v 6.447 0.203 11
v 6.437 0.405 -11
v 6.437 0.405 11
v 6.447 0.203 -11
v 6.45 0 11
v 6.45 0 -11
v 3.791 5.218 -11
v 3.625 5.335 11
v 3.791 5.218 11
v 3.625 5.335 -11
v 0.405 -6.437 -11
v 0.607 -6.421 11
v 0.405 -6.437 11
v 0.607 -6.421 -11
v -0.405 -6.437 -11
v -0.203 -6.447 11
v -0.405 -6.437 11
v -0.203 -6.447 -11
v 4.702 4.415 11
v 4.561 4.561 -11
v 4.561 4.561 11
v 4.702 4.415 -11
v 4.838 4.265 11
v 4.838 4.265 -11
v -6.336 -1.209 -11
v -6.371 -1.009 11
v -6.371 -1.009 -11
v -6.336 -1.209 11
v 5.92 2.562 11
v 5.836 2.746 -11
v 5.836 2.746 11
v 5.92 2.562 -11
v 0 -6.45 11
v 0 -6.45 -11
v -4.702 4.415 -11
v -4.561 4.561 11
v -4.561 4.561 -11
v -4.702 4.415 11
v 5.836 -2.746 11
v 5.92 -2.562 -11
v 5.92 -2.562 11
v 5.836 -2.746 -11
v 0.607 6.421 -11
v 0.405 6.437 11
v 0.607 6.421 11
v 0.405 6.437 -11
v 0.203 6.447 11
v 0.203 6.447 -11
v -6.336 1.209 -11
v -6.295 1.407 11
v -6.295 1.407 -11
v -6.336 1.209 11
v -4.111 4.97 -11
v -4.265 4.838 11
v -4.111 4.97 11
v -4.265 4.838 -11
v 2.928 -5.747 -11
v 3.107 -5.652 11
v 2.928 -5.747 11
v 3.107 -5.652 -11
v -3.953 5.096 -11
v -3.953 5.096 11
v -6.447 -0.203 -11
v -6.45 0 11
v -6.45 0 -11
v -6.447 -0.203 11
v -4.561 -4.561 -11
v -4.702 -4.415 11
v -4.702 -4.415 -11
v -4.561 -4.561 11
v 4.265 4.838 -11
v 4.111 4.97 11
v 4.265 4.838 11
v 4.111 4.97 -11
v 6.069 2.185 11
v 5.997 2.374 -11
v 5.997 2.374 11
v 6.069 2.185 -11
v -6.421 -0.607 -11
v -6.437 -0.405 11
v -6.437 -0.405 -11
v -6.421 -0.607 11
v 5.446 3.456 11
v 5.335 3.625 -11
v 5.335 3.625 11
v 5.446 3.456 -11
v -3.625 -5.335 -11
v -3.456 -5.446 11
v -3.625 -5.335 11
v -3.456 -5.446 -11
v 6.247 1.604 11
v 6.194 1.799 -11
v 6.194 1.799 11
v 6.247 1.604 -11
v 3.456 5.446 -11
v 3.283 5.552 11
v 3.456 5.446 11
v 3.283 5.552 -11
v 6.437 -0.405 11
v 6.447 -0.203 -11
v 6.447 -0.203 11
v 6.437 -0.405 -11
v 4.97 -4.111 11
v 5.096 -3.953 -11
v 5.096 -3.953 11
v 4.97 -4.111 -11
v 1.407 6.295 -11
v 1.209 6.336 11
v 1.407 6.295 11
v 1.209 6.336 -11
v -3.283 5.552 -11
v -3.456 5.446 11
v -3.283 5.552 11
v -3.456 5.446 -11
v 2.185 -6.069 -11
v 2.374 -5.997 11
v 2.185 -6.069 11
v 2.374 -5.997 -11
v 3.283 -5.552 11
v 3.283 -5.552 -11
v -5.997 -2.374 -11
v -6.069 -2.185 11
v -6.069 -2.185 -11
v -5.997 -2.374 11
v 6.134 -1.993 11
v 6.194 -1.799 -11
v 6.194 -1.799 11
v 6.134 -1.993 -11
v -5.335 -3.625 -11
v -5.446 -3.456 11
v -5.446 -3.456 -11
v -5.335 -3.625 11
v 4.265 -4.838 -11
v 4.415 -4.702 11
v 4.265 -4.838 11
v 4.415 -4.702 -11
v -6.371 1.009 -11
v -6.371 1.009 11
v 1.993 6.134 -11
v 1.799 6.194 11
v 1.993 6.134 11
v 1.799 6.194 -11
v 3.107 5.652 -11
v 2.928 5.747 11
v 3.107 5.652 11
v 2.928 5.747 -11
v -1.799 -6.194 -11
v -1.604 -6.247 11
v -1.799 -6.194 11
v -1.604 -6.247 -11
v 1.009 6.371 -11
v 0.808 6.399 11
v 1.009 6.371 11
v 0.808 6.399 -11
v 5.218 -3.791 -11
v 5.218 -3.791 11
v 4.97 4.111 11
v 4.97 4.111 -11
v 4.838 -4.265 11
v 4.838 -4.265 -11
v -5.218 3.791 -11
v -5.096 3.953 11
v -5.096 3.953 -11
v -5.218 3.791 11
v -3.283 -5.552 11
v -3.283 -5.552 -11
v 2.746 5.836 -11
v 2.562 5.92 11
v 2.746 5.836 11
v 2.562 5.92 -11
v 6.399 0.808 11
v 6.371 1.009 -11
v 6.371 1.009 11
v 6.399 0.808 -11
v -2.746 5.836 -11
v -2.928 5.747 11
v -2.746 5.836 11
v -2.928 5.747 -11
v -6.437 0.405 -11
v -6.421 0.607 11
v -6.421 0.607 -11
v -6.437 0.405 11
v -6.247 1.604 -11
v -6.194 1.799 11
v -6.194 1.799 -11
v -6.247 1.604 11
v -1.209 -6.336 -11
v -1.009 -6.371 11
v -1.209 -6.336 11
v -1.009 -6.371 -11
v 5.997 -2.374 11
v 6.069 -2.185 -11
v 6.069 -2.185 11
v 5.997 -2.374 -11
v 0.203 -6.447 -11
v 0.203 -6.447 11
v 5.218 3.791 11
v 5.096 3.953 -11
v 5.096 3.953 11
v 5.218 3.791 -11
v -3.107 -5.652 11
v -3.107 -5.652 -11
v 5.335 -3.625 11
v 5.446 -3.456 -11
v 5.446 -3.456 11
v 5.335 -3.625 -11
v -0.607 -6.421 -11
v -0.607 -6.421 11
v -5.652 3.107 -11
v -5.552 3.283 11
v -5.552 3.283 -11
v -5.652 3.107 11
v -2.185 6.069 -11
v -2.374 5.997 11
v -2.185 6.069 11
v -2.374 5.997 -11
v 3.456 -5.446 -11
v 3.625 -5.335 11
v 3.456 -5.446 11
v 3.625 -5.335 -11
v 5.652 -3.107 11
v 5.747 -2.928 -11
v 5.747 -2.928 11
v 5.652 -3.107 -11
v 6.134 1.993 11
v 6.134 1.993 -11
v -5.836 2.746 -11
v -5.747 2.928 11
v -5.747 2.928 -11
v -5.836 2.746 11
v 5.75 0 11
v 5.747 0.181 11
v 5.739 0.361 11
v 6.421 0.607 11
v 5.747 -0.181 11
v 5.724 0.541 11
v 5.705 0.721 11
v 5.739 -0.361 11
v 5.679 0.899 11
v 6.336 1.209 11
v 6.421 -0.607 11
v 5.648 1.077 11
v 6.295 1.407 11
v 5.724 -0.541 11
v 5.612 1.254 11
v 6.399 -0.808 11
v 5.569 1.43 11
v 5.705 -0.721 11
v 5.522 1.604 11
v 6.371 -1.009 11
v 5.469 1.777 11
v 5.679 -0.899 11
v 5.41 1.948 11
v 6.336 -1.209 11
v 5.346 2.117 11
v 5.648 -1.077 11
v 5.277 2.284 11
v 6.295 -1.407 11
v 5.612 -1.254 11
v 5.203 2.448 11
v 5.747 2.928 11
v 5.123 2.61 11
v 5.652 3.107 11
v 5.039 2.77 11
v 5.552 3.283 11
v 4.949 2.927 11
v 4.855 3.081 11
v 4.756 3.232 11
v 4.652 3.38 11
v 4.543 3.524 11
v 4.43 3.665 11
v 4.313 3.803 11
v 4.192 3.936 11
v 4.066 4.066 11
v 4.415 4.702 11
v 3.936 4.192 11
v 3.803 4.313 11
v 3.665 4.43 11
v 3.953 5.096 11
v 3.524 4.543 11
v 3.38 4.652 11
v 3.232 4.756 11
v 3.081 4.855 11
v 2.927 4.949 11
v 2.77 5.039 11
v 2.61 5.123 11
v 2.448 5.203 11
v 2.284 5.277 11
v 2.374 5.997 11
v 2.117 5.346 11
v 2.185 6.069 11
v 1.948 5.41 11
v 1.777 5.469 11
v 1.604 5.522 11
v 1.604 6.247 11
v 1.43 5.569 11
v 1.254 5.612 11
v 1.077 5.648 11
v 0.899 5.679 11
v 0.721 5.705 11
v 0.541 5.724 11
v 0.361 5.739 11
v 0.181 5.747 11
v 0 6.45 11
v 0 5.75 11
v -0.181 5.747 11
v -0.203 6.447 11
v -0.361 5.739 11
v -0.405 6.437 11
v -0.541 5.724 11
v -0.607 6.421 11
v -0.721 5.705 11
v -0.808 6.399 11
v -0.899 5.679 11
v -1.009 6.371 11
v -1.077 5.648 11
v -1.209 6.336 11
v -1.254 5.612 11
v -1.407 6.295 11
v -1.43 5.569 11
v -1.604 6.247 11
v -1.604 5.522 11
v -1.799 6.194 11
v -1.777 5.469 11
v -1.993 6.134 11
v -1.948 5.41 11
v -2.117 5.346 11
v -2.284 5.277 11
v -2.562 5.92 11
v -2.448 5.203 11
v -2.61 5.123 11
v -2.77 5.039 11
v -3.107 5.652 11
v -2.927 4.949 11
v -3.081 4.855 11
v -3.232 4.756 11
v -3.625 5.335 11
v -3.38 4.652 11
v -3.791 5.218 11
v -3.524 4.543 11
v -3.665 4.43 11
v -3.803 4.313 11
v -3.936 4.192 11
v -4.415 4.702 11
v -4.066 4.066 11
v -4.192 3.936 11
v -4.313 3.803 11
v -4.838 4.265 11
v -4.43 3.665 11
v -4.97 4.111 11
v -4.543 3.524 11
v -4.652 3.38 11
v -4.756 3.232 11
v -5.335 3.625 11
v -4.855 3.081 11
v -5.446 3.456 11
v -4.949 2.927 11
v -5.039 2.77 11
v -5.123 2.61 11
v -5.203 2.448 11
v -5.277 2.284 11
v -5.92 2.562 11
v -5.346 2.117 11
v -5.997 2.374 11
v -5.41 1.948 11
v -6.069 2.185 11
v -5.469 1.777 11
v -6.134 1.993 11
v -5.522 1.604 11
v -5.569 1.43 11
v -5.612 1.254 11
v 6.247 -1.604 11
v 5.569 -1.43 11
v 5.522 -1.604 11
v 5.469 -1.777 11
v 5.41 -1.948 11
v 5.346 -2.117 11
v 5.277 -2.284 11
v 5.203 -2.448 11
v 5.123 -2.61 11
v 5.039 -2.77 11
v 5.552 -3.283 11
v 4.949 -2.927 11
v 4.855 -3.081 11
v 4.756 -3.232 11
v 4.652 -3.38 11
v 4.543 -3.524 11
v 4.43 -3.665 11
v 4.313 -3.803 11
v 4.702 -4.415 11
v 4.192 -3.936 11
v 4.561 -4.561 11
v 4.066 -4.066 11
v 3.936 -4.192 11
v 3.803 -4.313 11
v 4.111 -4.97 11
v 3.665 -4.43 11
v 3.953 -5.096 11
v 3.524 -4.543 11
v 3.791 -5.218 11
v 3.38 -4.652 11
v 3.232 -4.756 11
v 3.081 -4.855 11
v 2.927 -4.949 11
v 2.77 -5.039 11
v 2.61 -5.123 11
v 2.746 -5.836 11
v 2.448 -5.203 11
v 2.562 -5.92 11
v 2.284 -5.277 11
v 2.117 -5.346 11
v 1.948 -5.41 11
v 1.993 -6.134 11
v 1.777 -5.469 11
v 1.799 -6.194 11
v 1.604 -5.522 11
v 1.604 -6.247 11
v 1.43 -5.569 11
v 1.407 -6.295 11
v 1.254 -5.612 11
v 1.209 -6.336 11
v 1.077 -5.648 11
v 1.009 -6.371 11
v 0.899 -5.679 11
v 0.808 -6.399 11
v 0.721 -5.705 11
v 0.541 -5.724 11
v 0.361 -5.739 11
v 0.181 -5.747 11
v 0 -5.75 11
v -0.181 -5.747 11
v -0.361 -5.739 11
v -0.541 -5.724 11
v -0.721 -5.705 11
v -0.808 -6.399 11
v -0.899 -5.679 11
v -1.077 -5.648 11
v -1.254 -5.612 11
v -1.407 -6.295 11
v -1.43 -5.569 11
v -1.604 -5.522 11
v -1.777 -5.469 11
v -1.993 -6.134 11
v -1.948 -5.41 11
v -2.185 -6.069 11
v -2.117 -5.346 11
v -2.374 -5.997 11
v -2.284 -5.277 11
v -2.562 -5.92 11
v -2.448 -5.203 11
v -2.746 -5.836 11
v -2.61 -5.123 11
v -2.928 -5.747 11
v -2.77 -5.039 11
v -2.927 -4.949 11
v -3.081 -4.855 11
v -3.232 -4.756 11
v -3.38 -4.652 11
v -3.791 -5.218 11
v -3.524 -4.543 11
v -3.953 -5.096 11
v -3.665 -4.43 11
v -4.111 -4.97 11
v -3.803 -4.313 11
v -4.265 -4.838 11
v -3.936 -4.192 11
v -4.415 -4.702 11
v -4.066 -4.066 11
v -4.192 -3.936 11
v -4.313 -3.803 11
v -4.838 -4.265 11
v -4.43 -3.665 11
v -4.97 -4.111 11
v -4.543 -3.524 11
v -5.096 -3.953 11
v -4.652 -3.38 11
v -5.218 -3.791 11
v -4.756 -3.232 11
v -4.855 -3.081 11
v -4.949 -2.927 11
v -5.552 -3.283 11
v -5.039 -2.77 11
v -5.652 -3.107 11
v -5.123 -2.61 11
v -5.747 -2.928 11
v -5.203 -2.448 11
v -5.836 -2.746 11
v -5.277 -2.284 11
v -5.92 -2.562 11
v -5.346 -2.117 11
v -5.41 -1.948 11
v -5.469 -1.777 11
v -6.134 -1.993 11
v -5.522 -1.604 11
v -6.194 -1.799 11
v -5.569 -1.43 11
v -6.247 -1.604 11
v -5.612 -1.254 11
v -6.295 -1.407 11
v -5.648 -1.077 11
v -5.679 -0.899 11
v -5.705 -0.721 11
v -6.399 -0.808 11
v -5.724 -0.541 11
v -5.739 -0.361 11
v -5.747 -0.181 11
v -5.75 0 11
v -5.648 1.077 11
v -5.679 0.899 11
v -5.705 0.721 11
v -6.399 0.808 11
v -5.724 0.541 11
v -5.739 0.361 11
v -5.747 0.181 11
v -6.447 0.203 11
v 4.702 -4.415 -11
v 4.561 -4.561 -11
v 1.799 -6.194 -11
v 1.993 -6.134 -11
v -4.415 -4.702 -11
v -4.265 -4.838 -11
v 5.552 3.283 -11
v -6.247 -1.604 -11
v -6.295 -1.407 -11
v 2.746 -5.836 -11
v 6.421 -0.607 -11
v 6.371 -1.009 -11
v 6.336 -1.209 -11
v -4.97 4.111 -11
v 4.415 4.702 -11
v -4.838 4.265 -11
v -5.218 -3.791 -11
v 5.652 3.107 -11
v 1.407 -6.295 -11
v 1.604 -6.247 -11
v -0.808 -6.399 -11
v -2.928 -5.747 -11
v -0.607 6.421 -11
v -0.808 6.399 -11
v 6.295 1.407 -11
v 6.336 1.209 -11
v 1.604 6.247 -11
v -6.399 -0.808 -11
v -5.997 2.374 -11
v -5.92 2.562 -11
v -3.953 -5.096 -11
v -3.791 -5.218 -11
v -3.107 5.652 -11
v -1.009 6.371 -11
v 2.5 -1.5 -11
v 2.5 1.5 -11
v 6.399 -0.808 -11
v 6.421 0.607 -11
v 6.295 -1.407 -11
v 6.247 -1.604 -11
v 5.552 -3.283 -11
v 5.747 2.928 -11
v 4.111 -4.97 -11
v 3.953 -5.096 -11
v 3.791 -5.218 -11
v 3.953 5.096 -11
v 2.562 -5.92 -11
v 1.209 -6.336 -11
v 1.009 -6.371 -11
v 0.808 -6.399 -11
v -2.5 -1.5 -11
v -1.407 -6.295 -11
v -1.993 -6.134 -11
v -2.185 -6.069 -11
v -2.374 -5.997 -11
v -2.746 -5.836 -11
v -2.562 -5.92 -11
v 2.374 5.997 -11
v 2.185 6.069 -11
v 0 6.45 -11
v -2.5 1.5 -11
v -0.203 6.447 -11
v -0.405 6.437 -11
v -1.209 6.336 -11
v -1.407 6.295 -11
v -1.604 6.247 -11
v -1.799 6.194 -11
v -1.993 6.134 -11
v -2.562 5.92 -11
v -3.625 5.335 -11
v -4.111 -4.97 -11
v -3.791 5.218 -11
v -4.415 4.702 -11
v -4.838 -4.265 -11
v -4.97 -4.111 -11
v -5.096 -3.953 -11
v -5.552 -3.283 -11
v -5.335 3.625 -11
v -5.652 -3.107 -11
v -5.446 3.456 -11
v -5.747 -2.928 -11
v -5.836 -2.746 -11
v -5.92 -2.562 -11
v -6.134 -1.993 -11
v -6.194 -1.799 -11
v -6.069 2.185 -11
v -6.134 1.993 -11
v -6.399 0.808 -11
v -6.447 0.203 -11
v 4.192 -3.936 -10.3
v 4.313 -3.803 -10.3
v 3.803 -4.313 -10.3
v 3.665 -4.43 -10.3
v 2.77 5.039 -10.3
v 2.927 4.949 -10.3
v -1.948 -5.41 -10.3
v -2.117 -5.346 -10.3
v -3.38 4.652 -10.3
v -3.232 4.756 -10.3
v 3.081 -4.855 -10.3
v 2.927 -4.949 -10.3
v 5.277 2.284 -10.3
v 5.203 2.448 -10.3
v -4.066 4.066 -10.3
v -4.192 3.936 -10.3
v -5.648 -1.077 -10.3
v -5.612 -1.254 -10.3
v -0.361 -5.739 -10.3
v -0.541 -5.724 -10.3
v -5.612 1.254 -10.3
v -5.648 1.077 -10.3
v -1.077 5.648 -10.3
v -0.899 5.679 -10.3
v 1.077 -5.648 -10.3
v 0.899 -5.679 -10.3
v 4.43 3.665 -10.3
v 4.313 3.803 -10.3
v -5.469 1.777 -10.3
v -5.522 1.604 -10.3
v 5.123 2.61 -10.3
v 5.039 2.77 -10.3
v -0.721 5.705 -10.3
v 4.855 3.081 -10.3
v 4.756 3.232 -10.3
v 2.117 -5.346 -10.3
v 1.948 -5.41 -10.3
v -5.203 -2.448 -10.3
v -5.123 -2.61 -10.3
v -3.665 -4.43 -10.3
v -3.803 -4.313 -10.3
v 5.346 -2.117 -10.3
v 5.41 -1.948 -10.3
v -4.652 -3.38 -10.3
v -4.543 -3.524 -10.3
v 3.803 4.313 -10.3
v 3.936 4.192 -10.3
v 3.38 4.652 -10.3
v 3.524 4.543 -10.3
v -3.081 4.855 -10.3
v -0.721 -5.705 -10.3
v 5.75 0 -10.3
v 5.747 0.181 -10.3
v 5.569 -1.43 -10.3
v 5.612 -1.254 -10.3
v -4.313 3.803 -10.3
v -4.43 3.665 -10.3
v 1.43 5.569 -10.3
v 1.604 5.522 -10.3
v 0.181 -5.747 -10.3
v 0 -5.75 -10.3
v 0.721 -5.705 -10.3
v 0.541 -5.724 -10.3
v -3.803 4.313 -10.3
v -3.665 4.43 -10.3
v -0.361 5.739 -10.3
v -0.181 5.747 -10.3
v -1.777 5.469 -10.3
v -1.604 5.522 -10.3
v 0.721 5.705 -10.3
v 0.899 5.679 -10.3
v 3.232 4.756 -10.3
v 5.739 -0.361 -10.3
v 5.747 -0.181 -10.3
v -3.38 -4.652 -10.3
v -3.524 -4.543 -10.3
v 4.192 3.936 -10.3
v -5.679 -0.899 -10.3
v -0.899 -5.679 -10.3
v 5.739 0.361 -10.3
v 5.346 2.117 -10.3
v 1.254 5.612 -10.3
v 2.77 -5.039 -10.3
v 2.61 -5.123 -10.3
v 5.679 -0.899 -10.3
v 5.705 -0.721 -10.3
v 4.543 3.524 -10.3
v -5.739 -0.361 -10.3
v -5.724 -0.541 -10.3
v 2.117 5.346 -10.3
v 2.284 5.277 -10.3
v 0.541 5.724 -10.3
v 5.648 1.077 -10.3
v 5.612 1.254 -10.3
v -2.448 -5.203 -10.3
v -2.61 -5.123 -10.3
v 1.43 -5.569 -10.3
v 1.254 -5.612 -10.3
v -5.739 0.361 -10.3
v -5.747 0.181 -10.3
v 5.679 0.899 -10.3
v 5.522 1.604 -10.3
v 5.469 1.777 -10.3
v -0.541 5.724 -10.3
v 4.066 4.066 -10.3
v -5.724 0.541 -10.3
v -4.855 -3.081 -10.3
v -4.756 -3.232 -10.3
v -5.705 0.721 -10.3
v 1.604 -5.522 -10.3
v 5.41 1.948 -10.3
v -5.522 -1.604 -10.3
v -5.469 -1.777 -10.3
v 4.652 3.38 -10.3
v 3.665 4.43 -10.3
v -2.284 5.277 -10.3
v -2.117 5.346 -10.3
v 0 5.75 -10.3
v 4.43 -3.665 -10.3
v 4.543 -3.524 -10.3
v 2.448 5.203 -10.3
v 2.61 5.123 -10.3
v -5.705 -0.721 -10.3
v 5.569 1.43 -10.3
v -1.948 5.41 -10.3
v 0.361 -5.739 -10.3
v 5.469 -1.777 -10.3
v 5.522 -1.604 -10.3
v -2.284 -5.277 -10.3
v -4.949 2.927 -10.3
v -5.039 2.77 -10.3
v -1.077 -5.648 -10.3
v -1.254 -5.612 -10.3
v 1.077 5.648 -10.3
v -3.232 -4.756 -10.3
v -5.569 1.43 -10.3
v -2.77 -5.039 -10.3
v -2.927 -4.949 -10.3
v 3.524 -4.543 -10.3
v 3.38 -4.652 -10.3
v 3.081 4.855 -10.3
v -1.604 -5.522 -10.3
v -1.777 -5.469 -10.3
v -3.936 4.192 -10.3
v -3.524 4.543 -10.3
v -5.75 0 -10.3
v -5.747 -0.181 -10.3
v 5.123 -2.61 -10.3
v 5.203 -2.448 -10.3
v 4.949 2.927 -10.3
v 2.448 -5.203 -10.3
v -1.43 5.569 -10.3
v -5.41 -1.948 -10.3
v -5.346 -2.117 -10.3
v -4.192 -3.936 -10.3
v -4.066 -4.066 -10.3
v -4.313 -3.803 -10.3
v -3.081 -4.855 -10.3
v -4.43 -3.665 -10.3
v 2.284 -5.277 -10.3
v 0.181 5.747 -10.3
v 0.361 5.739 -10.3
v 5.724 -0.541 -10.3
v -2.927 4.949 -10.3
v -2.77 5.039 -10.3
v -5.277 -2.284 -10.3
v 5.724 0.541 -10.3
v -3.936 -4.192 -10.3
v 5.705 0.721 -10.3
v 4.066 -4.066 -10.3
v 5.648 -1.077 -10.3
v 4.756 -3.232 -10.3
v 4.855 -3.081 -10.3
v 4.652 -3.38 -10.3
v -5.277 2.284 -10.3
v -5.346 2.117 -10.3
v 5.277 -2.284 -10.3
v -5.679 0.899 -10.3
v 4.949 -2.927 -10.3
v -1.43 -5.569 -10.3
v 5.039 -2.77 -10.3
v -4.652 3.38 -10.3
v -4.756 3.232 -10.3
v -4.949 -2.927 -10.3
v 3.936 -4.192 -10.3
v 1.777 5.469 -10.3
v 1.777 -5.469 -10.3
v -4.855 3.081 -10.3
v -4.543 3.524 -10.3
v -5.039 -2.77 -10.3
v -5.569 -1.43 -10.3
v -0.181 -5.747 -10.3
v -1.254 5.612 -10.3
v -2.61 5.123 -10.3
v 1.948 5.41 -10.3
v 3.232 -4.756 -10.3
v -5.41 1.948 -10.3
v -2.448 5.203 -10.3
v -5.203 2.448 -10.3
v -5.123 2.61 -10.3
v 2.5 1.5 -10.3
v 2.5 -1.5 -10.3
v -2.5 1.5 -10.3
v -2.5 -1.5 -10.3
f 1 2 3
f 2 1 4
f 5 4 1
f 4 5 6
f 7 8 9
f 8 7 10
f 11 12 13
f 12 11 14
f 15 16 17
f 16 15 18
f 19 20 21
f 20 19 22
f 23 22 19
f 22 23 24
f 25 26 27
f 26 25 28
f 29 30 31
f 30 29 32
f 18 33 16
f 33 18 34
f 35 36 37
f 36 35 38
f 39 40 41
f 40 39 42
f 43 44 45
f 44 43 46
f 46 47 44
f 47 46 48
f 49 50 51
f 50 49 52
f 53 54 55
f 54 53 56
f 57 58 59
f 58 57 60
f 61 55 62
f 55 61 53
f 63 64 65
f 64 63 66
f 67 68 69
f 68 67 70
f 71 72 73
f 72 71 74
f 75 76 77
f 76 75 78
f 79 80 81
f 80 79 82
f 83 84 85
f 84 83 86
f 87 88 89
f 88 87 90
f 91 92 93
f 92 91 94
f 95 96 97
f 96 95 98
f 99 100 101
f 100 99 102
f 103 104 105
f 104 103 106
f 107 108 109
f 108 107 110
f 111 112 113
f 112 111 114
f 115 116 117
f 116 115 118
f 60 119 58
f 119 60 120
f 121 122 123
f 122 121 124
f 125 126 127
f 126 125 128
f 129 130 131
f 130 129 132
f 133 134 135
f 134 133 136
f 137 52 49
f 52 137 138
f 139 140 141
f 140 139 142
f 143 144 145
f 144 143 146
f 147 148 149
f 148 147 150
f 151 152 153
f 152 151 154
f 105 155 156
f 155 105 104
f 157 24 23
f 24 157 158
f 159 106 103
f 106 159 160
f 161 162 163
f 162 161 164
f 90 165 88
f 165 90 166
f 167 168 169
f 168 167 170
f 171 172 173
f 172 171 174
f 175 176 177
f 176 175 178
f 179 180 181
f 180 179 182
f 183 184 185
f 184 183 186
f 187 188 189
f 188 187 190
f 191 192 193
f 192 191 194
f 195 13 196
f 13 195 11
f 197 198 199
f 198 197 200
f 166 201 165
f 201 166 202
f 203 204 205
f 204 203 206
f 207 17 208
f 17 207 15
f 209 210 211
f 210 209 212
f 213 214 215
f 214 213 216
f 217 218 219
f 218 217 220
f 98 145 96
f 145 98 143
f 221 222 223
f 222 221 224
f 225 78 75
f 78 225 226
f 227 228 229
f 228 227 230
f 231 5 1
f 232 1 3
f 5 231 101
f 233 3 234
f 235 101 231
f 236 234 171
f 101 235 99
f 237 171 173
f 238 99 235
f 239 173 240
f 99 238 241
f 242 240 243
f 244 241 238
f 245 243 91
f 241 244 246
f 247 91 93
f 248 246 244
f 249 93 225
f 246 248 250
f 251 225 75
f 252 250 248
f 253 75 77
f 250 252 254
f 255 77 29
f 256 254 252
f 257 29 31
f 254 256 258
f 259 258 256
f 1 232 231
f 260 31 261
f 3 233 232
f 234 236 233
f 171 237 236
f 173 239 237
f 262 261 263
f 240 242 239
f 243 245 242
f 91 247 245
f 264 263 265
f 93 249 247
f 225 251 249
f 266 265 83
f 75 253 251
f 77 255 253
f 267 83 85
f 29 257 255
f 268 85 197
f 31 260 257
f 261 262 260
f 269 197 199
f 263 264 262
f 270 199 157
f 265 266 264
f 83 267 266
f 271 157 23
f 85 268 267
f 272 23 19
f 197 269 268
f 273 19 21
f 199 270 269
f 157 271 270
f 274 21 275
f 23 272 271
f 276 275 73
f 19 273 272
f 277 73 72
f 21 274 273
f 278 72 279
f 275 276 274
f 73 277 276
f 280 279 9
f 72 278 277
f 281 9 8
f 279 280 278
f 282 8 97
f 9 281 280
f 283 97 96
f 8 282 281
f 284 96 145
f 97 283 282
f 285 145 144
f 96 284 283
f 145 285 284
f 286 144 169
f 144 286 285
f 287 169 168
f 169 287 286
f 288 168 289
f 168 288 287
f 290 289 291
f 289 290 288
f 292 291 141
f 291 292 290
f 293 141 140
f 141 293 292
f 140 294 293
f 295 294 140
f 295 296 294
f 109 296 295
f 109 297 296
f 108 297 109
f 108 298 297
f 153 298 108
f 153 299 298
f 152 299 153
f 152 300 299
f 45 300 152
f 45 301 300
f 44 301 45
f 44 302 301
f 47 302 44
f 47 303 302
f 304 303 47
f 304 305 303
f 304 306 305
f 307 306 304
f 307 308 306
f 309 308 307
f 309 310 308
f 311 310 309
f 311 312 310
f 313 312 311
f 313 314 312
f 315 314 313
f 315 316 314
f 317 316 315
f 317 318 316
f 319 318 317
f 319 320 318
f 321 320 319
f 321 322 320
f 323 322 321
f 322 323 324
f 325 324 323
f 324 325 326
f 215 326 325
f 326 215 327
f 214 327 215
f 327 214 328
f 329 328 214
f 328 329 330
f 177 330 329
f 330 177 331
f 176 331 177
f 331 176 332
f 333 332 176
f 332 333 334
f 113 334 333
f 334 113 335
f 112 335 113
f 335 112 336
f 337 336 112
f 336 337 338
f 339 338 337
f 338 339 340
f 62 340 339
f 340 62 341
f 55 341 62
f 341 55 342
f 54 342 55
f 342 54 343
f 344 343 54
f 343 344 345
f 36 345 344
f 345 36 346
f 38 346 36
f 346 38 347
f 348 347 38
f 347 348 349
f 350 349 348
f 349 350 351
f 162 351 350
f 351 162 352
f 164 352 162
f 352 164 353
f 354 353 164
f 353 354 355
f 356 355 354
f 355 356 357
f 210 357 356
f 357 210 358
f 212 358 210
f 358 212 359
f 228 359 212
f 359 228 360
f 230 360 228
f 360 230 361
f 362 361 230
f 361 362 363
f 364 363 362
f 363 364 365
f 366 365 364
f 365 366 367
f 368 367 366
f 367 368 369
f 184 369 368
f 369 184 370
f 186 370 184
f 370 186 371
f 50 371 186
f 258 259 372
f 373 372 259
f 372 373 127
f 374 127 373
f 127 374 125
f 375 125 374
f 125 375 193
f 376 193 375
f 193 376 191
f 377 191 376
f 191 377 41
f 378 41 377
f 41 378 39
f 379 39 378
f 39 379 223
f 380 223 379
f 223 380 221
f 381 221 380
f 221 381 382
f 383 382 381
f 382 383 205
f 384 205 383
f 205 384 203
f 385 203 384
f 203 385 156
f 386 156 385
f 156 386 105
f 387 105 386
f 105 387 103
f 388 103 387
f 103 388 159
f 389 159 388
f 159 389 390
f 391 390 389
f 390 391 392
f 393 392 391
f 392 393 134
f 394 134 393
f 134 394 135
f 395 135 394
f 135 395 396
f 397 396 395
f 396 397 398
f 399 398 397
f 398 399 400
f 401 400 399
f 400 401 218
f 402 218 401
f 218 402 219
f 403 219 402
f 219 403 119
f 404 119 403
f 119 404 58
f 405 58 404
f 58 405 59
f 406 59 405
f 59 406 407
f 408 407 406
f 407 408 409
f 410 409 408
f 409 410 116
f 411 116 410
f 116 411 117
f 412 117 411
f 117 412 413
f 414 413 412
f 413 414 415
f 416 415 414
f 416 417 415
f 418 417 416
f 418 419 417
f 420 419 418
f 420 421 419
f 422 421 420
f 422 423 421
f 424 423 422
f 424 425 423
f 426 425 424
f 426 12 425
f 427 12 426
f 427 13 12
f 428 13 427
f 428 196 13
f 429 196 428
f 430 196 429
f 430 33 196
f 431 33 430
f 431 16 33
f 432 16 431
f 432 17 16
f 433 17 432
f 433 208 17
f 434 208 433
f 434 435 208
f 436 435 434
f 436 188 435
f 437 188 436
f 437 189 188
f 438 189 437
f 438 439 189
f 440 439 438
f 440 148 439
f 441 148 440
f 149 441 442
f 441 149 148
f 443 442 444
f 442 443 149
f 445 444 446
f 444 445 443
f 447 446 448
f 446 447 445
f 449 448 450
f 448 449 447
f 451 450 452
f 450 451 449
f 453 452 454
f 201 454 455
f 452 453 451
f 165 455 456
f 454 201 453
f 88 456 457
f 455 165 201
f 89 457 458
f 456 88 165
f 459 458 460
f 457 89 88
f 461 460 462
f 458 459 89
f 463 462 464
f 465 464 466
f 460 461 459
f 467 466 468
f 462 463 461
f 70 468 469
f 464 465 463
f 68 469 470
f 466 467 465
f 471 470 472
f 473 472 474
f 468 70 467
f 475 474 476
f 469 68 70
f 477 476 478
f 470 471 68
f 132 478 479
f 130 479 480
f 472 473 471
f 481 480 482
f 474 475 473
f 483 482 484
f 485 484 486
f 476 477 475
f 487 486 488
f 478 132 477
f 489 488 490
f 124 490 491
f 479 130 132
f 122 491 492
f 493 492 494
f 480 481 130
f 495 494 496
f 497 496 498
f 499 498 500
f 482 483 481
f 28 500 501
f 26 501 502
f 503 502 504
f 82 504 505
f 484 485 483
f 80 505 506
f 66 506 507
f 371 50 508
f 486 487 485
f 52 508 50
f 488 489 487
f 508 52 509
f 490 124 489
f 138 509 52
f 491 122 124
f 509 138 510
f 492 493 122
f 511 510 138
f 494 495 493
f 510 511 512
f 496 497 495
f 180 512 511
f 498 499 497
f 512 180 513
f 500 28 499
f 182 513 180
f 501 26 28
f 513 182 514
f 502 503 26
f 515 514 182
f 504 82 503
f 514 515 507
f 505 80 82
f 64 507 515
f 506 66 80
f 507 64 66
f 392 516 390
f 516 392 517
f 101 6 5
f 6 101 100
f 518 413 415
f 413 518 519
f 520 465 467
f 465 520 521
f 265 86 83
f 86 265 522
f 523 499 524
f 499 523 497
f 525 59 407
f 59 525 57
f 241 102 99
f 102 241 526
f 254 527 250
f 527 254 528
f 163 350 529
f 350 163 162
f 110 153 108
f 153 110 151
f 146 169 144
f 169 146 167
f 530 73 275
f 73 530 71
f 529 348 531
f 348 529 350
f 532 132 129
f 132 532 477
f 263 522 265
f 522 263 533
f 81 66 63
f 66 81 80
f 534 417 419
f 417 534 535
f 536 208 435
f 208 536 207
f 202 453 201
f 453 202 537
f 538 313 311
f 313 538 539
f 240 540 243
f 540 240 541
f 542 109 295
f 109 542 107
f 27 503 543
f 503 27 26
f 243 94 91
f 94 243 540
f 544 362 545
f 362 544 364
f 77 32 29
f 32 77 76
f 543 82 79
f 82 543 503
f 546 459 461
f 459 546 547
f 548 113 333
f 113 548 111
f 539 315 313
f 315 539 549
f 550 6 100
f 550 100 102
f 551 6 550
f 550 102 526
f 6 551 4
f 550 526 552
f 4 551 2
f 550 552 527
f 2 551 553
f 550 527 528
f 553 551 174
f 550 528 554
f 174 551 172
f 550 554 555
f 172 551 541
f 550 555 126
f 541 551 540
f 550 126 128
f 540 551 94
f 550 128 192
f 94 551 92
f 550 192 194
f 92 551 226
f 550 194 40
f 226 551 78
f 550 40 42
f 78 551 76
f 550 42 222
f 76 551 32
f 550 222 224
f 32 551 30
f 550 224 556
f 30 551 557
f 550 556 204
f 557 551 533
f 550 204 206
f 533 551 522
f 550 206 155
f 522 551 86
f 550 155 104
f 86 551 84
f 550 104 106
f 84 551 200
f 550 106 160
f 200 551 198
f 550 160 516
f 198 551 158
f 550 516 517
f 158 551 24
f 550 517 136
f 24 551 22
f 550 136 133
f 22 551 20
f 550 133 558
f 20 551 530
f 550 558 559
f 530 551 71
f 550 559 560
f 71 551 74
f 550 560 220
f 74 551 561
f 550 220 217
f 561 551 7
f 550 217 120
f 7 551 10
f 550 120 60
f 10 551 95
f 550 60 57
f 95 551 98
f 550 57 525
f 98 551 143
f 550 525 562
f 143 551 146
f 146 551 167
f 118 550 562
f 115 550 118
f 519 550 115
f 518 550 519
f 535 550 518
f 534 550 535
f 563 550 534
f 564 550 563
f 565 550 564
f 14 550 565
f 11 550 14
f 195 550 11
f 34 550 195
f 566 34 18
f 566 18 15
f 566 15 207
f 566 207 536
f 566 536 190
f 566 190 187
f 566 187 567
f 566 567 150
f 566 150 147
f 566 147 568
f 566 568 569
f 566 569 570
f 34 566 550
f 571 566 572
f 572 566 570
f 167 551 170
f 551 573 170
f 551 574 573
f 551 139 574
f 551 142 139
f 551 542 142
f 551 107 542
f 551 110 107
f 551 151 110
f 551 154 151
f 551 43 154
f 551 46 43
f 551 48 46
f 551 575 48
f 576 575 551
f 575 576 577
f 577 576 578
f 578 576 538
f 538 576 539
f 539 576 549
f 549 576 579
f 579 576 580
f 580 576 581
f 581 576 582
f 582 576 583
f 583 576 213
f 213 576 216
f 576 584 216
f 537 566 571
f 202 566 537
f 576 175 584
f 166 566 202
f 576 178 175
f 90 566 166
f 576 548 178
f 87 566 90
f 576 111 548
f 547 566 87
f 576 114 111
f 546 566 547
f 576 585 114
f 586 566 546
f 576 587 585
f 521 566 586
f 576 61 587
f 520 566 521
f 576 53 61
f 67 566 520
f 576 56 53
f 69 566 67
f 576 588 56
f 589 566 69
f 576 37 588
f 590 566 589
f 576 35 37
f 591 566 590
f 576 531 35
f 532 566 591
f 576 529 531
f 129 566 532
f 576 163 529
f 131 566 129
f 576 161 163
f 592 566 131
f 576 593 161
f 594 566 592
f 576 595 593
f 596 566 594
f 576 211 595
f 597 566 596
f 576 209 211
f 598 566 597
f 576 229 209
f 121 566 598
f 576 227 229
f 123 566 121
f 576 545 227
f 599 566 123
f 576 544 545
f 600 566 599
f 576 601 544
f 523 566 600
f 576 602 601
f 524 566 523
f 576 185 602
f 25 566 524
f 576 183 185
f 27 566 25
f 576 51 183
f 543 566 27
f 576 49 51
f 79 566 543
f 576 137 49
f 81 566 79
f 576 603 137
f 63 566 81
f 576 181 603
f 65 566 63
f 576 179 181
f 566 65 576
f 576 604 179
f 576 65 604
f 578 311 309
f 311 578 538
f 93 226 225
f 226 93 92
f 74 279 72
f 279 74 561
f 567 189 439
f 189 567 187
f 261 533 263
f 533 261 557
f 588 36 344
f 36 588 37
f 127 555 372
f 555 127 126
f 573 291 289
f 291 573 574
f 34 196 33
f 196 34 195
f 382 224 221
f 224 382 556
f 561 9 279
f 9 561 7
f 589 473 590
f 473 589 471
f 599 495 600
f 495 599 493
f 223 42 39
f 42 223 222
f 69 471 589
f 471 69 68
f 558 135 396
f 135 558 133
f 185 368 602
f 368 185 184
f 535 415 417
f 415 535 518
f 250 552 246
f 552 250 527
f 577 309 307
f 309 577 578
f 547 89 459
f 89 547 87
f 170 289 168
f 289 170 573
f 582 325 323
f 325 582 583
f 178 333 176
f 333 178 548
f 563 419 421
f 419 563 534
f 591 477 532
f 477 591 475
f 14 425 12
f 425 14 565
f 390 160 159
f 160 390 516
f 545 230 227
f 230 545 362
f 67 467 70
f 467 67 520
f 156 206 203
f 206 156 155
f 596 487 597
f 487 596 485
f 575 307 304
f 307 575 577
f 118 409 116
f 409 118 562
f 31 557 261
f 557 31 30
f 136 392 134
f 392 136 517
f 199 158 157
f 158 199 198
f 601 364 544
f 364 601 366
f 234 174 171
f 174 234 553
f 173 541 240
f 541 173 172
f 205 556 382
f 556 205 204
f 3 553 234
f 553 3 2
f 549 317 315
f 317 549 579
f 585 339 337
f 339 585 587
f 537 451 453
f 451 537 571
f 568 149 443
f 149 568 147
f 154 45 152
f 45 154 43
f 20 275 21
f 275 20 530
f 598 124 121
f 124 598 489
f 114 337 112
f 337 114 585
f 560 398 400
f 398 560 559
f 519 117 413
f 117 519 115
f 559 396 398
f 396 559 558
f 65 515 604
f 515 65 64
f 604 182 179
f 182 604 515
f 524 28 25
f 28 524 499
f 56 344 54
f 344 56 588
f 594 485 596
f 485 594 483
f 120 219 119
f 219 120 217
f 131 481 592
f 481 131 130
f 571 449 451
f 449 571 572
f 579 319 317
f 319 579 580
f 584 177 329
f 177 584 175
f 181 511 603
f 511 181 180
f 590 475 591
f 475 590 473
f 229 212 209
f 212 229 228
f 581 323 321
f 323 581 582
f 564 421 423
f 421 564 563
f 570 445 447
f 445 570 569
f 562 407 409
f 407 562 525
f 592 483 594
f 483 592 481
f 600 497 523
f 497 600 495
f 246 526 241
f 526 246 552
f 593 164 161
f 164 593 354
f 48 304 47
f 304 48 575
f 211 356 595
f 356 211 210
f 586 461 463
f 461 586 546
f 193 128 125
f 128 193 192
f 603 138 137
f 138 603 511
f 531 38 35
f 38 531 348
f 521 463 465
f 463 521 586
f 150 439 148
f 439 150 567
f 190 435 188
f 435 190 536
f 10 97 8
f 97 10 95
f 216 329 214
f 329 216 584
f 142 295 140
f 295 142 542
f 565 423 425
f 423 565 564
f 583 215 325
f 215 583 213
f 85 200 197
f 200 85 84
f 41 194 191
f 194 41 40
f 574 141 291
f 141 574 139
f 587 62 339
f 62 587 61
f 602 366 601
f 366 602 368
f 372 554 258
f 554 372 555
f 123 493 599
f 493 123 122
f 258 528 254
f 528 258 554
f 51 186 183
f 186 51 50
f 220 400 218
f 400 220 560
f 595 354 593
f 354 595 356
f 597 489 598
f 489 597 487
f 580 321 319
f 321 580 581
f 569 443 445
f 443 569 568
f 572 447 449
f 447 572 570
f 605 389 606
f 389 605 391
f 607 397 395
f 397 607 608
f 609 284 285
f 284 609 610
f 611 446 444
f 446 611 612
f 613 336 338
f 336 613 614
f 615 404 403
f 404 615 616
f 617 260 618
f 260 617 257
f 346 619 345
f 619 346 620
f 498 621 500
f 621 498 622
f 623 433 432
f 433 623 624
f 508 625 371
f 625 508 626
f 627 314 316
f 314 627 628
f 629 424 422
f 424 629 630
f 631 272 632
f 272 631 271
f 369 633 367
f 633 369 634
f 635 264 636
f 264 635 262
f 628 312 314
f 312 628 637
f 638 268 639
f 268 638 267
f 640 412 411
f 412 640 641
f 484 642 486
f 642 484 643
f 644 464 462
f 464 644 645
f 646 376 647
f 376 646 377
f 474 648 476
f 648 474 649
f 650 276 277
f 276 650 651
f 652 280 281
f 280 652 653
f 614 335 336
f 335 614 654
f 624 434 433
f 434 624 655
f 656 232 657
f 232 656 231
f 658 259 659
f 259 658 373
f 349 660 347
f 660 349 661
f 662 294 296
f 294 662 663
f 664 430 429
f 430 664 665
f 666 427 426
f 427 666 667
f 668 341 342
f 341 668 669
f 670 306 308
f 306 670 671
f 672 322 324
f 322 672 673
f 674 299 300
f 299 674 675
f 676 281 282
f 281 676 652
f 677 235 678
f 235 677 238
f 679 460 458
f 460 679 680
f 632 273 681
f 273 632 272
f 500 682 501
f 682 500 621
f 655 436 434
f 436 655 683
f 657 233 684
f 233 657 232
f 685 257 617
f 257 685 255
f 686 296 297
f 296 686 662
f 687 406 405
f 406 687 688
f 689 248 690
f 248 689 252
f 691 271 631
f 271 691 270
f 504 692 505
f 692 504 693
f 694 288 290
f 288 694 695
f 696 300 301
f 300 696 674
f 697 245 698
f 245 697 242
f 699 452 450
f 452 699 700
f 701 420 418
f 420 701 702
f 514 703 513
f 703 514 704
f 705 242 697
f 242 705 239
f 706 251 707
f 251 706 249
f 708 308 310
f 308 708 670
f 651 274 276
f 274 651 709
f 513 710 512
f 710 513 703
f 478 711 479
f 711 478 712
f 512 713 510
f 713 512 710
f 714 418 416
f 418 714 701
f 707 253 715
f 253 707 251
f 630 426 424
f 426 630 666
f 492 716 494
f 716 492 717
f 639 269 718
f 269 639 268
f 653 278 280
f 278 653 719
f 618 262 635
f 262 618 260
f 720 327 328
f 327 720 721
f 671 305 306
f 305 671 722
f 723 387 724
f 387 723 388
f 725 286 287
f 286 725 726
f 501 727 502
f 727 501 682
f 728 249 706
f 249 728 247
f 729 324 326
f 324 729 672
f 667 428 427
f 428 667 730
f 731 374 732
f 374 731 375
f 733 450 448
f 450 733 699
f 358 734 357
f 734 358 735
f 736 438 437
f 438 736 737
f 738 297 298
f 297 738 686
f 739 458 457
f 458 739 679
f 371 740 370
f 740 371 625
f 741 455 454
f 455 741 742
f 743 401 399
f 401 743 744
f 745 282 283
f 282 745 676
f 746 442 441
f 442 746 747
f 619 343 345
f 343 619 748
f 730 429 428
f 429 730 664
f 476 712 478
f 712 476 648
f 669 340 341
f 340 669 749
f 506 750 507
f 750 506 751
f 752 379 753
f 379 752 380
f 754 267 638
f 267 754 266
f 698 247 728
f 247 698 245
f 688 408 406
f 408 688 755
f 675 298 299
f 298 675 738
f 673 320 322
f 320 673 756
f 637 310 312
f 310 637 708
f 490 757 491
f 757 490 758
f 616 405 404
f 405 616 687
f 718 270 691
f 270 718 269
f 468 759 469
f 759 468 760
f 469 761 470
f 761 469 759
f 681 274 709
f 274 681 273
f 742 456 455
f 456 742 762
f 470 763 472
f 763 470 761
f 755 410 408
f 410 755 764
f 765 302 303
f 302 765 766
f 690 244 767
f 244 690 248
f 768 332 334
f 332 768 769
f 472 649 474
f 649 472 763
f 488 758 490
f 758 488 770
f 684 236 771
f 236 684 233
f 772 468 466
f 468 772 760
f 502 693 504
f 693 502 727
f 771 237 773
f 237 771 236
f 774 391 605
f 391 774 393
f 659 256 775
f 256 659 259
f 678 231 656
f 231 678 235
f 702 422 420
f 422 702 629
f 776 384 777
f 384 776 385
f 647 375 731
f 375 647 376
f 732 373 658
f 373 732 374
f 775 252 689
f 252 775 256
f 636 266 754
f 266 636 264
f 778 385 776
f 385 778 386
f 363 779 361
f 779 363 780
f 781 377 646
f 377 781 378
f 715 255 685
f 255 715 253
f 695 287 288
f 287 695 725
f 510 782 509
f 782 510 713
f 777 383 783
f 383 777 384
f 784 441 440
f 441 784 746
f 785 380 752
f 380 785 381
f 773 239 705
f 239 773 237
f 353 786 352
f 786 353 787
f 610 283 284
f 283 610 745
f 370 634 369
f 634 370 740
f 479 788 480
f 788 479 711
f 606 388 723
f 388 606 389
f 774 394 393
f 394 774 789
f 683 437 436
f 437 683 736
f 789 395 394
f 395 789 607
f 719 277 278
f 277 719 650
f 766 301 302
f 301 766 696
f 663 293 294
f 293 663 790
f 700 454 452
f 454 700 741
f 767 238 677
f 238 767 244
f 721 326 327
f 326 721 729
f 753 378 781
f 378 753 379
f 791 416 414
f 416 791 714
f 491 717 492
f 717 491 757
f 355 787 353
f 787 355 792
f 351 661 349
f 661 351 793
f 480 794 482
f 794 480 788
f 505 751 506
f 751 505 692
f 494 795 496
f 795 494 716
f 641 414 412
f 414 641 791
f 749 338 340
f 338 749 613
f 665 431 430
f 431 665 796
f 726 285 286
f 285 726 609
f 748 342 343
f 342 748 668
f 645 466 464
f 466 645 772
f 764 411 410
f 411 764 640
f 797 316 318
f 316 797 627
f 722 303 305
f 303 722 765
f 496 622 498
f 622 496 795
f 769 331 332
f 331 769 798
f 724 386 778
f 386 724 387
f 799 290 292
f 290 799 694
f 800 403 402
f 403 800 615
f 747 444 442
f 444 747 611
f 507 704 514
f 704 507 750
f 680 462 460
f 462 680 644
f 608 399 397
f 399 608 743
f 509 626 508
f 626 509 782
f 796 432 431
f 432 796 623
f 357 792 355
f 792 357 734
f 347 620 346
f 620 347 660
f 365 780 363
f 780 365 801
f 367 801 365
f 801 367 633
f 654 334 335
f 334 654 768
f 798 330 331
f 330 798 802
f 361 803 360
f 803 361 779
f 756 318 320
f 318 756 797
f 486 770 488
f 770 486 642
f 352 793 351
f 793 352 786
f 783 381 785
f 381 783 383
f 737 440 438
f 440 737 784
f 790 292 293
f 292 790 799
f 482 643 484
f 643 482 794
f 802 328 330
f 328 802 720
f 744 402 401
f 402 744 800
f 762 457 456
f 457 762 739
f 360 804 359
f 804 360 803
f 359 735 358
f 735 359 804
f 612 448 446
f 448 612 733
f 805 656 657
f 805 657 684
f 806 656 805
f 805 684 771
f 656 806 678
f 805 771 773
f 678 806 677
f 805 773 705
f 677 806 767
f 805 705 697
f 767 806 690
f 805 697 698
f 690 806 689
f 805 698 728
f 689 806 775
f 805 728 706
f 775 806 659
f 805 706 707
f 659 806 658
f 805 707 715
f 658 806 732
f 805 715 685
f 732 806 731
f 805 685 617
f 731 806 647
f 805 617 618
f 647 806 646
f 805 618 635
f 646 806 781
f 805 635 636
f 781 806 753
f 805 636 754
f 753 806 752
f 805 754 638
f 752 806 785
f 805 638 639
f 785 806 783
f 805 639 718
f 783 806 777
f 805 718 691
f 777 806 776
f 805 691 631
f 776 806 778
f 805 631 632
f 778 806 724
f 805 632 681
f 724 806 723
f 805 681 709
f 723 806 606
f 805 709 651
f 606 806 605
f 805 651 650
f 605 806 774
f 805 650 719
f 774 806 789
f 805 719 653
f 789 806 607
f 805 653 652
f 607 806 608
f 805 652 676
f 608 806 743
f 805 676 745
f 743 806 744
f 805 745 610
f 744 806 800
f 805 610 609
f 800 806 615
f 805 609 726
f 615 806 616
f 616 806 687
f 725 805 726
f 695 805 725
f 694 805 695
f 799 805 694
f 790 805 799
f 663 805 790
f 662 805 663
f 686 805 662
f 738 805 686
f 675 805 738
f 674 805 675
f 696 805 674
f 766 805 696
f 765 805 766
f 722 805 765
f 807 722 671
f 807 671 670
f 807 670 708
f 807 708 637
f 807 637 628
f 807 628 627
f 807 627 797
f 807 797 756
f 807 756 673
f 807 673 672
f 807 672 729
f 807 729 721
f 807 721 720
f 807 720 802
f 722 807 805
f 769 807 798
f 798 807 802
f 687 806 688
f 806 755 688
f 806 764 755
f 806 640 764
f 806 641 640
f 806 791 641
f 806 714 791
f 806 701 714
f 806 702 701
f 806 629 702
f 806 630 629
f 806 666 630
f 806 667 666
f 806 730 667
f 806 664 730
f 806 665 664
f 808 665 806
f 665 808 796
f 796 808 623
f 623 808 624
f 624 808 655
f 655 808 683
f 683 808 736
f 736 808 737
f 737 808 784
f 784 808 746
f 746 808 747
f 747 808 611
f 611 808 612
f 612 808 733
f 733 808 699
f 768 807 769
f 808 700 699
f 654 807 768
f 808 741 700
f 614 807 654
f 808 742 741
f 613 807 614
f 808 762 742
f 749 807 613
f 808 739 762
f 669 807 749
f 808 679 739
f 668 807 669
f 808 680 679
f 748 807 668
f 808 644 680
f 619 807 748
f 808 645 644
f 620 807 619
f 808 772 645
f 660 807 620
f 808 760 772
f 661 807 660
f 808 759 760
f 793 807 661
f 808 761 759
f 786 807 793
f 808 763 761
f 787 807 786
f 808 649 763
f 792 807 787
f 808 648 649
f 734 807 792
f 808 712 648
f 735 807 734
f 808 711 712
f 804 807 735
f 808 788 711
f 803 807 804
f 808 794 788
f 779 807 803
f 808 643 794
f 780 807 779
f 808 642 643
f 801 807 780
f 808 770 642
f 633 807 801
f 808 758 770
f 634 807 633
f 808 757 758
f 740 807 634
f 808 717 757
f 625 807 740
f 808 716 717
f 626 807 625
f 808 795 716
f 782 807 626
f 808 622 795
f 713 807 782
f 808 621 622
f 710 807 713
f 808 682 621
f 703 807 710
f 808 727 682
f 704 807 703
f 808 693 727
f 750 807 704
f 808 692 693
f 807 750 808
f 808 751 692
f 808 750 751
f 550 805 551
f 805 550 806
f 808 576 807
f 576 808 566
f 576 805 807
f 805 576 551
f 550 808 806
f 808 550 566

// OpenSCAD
/**
 *    PIR_cover
 * 
 *    @author         Karel Fiala
 *    @email          fiala.karel@gmail.com
 */

$fn=200;

module PIR_cover(rounded = 0) {

    // code
    pir_width = 11.5/2;
    pir_height = 22;
    wall_thick = 0.7;
    
    difference() {
        union() {
            difference() {
                cylinder(r1=pir_width + wall_thick, r2=pir_width + wall_thick, h=pir_height, center=true);
                cylinder(r1=pir_width, r2=pir_width, h=pir_height, center=true);
            }
            translate([0, 0, -pir_height/2 + wall_thick/2])
                    cylinder(r1=pir_width, r2=pir_width, h=wall_thick, center=true);
            
            if (rounded == 0) {
                difference() {
                    cube([pir_width*2  + 2*wall_thick, pir_width*2  + 2*wall_thick, pir_height], center = true);
                    cube([pir_width*2, pir_width*2, pir_height], center = true);
                }
                translate([0, 0, -pir_height/2 + wall_thick/2])
                    cube([pir_width*2, pir_width*2, wall_thick], center = true);
            }
        }
        translate([0, 0, -pir_height/2 + wall_thick/2])
            cube([5, 3, wall_thick], center = true);
    }

}


// calling
PIR_cover(rounded = 1);
